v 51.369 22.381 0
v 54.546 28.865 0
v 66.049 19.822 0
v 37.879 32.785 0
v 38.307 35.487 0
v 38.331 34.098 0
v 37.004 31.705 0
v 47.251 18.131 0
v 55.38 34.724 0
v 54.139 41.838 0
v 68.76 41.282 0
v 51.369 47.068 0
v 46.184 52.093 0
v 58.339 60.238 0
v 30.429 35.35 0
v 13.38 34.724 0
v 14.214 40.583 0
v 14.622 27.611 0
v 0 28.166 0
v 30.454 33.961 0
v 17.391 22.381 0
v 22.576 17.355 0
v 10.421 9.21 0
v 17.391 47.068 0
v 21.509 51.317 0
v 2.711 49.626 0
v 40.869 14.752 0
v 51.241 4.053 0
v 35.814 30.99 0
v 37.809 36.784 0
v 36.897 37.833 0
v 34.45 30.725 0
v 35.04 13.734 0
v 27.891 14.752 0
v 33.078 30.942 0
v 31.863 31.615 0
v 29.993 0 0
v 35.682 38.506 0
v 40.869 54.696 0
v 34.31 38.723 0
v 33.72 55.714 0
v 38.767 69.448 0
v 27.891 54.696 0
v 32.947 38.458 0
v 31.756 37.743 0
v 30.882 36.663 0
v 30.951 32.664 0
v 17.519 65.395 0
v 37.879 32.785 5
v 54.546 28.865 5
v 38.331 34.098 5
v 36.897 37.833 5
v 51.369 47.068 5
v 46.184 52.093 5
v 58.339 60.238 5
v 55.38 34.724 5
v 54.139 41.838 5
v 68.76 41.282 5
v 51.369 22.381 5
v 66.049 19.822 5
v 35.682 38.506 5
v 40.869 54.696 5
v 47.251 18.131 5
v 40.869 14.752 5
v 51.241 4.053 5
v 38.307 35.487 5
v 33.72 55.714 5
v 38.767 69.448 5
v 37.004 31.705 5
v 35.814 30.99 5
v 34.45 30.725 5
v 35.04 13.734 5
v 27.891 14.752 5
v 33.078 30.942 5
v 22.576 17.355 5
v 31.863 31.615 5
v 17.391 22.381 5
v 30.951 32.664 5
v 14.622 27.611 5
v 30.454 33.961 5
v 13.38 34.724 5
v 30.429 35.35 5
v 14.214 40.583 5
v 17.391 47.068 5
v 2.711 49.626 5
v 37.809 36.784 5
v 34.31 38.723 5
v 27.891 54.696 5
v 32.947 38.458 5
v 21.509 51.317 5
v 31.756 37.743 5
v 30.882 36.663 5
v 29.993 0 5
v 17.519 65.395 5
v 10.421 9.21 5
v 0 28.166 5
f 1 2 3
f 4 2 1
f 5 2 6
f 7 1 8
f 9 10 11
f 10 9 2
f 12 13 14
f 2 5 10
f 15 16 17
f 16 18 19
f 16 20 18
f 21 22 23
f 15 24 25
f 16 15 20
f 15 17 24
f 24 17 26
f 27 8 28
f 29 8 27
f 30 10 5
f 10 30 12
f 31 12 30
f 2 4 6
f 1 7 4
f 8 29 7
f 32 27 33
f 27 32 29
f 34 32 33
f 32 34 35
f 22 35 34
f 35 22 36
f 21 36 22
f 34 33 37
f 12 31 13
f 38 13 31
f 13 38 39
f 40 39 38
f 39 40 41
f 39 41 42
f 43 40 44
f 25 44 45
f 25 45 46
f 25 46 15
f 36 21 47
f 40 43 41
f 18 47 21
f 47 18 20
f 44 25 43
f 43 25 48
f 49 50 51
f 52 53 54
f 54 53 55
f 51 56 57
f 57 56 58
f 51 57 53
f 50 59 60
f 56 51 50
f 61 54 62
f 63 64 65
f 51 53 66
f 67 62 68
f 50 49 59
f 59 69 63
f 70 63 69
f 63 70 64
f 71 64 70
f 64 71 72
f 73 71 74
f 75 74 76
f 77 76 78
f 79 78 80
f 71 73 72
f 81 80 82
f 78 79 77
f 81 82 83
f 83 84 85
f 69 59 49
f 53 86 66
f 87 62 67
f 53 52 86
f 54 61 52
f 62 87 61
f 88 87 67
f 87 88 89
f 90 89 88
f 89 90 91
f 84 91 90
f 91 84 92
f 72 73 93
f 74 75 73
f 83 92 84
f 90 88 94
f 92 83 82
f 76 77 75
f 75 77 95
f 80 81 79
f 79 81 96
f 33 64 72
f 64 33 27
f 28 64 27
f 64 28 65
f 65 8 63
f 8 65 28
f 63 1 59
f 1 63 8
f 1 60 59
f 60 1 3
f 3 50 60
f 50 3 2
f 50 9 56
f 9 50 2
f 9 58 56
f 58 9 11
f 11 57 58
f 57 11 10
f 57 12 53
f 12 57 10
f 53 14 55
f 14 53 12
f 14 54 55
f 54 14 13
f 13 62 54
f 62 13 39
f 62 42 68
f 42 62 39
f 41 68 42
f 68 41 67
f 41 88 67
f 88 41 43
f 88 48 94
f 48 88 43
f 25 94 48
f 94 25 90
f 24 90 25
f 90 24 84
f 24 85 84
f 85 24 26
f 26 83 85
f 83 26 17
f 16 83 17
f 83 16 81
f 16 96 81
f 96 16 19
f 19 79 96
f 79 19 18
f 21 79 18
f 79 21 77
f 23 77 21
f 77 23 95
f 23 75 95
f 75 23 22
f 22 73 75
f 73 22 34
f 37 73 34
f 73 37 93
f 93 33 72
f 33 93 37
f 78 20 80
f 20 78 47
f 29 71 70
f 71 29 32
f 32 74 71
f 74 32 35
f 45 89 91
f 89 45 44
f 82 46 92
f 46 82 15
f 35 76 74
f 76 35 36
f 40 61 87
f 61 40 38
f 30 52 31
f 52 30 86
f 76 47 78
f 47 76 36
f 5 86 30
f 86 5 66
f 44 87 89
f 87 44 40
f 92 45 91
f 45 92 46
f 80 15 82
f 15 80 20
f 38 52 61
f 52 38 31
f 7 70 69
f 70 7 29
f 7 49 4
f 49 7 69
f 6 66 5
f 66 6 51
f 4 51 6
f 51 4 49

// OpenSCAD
$fn = 32;

// ----------------------------------------------------------------------
// Star wheel: 10-point ratchet, R35
// ----------------------------------------------------------------------

// --- parameters (mm) ---
n_points = 10;            // number of points / teeth
r_out = 35;               // tip radius
r_in = 21;                // root radius
bore_r = 4;               // centre bore radius
plate_t = 5;              // plate thickness, Z (extrusion height)
bore_d = 8;               // centre bore diameter

profile = [[13.38, 34.724], [0, 28.166], [14.622, 27.611], [17.391, 22.381], [10.421, 9.21], [22.576, 17.355], [27.891, 14.752], [29.993, 0], [35.04, 13.734], [40.869, 14.752], [51.241, 4.053], [47.251, 18.131], [51.369, 22.381], [66.049, 19.822], [54.546, 28.865], [55.38, 34.724], [68.76, 41.282], [54.139, 41.838], [51.369, 47.068], [58.339, 60.238], [46.184, 52.093], [40.869, 54.696], [38.767, 69.448], [33.72, 55.714], [27.891, 54.696], [17.519, 65.395], [21.509, 51.317], [17.391, 47.068], [2.711, 49.626], [14.214, 40.583]];  // primary outline, 30 points, counter clockwise
void_1 = [[38.307, 35.487], [37.809, 36.784], [36.897, 37.833], [35.682, 38.506], [34.31, 38.723], [32.947, 38.458], [31.756, 37.743], [30.882, 36.663], [30.429, 35.35], [30.454, 33.961], [30.951, 32.664], [31.863, 31.615], [33.078, 30.942], [34.45, 30.725], [35.814, 30.99], [37.004, 31.705], [37.879, 32.785], [38.331, 34.098]];  // centre bore, 18 points

// --- the one profile operation ---
difference() {
  linear_extrude(height = plate_t) polygon(points = profile);
  translate([0, 0, -1])
    linear_extrude(height = plate_t + 2) polygon(points = void_1);
}
